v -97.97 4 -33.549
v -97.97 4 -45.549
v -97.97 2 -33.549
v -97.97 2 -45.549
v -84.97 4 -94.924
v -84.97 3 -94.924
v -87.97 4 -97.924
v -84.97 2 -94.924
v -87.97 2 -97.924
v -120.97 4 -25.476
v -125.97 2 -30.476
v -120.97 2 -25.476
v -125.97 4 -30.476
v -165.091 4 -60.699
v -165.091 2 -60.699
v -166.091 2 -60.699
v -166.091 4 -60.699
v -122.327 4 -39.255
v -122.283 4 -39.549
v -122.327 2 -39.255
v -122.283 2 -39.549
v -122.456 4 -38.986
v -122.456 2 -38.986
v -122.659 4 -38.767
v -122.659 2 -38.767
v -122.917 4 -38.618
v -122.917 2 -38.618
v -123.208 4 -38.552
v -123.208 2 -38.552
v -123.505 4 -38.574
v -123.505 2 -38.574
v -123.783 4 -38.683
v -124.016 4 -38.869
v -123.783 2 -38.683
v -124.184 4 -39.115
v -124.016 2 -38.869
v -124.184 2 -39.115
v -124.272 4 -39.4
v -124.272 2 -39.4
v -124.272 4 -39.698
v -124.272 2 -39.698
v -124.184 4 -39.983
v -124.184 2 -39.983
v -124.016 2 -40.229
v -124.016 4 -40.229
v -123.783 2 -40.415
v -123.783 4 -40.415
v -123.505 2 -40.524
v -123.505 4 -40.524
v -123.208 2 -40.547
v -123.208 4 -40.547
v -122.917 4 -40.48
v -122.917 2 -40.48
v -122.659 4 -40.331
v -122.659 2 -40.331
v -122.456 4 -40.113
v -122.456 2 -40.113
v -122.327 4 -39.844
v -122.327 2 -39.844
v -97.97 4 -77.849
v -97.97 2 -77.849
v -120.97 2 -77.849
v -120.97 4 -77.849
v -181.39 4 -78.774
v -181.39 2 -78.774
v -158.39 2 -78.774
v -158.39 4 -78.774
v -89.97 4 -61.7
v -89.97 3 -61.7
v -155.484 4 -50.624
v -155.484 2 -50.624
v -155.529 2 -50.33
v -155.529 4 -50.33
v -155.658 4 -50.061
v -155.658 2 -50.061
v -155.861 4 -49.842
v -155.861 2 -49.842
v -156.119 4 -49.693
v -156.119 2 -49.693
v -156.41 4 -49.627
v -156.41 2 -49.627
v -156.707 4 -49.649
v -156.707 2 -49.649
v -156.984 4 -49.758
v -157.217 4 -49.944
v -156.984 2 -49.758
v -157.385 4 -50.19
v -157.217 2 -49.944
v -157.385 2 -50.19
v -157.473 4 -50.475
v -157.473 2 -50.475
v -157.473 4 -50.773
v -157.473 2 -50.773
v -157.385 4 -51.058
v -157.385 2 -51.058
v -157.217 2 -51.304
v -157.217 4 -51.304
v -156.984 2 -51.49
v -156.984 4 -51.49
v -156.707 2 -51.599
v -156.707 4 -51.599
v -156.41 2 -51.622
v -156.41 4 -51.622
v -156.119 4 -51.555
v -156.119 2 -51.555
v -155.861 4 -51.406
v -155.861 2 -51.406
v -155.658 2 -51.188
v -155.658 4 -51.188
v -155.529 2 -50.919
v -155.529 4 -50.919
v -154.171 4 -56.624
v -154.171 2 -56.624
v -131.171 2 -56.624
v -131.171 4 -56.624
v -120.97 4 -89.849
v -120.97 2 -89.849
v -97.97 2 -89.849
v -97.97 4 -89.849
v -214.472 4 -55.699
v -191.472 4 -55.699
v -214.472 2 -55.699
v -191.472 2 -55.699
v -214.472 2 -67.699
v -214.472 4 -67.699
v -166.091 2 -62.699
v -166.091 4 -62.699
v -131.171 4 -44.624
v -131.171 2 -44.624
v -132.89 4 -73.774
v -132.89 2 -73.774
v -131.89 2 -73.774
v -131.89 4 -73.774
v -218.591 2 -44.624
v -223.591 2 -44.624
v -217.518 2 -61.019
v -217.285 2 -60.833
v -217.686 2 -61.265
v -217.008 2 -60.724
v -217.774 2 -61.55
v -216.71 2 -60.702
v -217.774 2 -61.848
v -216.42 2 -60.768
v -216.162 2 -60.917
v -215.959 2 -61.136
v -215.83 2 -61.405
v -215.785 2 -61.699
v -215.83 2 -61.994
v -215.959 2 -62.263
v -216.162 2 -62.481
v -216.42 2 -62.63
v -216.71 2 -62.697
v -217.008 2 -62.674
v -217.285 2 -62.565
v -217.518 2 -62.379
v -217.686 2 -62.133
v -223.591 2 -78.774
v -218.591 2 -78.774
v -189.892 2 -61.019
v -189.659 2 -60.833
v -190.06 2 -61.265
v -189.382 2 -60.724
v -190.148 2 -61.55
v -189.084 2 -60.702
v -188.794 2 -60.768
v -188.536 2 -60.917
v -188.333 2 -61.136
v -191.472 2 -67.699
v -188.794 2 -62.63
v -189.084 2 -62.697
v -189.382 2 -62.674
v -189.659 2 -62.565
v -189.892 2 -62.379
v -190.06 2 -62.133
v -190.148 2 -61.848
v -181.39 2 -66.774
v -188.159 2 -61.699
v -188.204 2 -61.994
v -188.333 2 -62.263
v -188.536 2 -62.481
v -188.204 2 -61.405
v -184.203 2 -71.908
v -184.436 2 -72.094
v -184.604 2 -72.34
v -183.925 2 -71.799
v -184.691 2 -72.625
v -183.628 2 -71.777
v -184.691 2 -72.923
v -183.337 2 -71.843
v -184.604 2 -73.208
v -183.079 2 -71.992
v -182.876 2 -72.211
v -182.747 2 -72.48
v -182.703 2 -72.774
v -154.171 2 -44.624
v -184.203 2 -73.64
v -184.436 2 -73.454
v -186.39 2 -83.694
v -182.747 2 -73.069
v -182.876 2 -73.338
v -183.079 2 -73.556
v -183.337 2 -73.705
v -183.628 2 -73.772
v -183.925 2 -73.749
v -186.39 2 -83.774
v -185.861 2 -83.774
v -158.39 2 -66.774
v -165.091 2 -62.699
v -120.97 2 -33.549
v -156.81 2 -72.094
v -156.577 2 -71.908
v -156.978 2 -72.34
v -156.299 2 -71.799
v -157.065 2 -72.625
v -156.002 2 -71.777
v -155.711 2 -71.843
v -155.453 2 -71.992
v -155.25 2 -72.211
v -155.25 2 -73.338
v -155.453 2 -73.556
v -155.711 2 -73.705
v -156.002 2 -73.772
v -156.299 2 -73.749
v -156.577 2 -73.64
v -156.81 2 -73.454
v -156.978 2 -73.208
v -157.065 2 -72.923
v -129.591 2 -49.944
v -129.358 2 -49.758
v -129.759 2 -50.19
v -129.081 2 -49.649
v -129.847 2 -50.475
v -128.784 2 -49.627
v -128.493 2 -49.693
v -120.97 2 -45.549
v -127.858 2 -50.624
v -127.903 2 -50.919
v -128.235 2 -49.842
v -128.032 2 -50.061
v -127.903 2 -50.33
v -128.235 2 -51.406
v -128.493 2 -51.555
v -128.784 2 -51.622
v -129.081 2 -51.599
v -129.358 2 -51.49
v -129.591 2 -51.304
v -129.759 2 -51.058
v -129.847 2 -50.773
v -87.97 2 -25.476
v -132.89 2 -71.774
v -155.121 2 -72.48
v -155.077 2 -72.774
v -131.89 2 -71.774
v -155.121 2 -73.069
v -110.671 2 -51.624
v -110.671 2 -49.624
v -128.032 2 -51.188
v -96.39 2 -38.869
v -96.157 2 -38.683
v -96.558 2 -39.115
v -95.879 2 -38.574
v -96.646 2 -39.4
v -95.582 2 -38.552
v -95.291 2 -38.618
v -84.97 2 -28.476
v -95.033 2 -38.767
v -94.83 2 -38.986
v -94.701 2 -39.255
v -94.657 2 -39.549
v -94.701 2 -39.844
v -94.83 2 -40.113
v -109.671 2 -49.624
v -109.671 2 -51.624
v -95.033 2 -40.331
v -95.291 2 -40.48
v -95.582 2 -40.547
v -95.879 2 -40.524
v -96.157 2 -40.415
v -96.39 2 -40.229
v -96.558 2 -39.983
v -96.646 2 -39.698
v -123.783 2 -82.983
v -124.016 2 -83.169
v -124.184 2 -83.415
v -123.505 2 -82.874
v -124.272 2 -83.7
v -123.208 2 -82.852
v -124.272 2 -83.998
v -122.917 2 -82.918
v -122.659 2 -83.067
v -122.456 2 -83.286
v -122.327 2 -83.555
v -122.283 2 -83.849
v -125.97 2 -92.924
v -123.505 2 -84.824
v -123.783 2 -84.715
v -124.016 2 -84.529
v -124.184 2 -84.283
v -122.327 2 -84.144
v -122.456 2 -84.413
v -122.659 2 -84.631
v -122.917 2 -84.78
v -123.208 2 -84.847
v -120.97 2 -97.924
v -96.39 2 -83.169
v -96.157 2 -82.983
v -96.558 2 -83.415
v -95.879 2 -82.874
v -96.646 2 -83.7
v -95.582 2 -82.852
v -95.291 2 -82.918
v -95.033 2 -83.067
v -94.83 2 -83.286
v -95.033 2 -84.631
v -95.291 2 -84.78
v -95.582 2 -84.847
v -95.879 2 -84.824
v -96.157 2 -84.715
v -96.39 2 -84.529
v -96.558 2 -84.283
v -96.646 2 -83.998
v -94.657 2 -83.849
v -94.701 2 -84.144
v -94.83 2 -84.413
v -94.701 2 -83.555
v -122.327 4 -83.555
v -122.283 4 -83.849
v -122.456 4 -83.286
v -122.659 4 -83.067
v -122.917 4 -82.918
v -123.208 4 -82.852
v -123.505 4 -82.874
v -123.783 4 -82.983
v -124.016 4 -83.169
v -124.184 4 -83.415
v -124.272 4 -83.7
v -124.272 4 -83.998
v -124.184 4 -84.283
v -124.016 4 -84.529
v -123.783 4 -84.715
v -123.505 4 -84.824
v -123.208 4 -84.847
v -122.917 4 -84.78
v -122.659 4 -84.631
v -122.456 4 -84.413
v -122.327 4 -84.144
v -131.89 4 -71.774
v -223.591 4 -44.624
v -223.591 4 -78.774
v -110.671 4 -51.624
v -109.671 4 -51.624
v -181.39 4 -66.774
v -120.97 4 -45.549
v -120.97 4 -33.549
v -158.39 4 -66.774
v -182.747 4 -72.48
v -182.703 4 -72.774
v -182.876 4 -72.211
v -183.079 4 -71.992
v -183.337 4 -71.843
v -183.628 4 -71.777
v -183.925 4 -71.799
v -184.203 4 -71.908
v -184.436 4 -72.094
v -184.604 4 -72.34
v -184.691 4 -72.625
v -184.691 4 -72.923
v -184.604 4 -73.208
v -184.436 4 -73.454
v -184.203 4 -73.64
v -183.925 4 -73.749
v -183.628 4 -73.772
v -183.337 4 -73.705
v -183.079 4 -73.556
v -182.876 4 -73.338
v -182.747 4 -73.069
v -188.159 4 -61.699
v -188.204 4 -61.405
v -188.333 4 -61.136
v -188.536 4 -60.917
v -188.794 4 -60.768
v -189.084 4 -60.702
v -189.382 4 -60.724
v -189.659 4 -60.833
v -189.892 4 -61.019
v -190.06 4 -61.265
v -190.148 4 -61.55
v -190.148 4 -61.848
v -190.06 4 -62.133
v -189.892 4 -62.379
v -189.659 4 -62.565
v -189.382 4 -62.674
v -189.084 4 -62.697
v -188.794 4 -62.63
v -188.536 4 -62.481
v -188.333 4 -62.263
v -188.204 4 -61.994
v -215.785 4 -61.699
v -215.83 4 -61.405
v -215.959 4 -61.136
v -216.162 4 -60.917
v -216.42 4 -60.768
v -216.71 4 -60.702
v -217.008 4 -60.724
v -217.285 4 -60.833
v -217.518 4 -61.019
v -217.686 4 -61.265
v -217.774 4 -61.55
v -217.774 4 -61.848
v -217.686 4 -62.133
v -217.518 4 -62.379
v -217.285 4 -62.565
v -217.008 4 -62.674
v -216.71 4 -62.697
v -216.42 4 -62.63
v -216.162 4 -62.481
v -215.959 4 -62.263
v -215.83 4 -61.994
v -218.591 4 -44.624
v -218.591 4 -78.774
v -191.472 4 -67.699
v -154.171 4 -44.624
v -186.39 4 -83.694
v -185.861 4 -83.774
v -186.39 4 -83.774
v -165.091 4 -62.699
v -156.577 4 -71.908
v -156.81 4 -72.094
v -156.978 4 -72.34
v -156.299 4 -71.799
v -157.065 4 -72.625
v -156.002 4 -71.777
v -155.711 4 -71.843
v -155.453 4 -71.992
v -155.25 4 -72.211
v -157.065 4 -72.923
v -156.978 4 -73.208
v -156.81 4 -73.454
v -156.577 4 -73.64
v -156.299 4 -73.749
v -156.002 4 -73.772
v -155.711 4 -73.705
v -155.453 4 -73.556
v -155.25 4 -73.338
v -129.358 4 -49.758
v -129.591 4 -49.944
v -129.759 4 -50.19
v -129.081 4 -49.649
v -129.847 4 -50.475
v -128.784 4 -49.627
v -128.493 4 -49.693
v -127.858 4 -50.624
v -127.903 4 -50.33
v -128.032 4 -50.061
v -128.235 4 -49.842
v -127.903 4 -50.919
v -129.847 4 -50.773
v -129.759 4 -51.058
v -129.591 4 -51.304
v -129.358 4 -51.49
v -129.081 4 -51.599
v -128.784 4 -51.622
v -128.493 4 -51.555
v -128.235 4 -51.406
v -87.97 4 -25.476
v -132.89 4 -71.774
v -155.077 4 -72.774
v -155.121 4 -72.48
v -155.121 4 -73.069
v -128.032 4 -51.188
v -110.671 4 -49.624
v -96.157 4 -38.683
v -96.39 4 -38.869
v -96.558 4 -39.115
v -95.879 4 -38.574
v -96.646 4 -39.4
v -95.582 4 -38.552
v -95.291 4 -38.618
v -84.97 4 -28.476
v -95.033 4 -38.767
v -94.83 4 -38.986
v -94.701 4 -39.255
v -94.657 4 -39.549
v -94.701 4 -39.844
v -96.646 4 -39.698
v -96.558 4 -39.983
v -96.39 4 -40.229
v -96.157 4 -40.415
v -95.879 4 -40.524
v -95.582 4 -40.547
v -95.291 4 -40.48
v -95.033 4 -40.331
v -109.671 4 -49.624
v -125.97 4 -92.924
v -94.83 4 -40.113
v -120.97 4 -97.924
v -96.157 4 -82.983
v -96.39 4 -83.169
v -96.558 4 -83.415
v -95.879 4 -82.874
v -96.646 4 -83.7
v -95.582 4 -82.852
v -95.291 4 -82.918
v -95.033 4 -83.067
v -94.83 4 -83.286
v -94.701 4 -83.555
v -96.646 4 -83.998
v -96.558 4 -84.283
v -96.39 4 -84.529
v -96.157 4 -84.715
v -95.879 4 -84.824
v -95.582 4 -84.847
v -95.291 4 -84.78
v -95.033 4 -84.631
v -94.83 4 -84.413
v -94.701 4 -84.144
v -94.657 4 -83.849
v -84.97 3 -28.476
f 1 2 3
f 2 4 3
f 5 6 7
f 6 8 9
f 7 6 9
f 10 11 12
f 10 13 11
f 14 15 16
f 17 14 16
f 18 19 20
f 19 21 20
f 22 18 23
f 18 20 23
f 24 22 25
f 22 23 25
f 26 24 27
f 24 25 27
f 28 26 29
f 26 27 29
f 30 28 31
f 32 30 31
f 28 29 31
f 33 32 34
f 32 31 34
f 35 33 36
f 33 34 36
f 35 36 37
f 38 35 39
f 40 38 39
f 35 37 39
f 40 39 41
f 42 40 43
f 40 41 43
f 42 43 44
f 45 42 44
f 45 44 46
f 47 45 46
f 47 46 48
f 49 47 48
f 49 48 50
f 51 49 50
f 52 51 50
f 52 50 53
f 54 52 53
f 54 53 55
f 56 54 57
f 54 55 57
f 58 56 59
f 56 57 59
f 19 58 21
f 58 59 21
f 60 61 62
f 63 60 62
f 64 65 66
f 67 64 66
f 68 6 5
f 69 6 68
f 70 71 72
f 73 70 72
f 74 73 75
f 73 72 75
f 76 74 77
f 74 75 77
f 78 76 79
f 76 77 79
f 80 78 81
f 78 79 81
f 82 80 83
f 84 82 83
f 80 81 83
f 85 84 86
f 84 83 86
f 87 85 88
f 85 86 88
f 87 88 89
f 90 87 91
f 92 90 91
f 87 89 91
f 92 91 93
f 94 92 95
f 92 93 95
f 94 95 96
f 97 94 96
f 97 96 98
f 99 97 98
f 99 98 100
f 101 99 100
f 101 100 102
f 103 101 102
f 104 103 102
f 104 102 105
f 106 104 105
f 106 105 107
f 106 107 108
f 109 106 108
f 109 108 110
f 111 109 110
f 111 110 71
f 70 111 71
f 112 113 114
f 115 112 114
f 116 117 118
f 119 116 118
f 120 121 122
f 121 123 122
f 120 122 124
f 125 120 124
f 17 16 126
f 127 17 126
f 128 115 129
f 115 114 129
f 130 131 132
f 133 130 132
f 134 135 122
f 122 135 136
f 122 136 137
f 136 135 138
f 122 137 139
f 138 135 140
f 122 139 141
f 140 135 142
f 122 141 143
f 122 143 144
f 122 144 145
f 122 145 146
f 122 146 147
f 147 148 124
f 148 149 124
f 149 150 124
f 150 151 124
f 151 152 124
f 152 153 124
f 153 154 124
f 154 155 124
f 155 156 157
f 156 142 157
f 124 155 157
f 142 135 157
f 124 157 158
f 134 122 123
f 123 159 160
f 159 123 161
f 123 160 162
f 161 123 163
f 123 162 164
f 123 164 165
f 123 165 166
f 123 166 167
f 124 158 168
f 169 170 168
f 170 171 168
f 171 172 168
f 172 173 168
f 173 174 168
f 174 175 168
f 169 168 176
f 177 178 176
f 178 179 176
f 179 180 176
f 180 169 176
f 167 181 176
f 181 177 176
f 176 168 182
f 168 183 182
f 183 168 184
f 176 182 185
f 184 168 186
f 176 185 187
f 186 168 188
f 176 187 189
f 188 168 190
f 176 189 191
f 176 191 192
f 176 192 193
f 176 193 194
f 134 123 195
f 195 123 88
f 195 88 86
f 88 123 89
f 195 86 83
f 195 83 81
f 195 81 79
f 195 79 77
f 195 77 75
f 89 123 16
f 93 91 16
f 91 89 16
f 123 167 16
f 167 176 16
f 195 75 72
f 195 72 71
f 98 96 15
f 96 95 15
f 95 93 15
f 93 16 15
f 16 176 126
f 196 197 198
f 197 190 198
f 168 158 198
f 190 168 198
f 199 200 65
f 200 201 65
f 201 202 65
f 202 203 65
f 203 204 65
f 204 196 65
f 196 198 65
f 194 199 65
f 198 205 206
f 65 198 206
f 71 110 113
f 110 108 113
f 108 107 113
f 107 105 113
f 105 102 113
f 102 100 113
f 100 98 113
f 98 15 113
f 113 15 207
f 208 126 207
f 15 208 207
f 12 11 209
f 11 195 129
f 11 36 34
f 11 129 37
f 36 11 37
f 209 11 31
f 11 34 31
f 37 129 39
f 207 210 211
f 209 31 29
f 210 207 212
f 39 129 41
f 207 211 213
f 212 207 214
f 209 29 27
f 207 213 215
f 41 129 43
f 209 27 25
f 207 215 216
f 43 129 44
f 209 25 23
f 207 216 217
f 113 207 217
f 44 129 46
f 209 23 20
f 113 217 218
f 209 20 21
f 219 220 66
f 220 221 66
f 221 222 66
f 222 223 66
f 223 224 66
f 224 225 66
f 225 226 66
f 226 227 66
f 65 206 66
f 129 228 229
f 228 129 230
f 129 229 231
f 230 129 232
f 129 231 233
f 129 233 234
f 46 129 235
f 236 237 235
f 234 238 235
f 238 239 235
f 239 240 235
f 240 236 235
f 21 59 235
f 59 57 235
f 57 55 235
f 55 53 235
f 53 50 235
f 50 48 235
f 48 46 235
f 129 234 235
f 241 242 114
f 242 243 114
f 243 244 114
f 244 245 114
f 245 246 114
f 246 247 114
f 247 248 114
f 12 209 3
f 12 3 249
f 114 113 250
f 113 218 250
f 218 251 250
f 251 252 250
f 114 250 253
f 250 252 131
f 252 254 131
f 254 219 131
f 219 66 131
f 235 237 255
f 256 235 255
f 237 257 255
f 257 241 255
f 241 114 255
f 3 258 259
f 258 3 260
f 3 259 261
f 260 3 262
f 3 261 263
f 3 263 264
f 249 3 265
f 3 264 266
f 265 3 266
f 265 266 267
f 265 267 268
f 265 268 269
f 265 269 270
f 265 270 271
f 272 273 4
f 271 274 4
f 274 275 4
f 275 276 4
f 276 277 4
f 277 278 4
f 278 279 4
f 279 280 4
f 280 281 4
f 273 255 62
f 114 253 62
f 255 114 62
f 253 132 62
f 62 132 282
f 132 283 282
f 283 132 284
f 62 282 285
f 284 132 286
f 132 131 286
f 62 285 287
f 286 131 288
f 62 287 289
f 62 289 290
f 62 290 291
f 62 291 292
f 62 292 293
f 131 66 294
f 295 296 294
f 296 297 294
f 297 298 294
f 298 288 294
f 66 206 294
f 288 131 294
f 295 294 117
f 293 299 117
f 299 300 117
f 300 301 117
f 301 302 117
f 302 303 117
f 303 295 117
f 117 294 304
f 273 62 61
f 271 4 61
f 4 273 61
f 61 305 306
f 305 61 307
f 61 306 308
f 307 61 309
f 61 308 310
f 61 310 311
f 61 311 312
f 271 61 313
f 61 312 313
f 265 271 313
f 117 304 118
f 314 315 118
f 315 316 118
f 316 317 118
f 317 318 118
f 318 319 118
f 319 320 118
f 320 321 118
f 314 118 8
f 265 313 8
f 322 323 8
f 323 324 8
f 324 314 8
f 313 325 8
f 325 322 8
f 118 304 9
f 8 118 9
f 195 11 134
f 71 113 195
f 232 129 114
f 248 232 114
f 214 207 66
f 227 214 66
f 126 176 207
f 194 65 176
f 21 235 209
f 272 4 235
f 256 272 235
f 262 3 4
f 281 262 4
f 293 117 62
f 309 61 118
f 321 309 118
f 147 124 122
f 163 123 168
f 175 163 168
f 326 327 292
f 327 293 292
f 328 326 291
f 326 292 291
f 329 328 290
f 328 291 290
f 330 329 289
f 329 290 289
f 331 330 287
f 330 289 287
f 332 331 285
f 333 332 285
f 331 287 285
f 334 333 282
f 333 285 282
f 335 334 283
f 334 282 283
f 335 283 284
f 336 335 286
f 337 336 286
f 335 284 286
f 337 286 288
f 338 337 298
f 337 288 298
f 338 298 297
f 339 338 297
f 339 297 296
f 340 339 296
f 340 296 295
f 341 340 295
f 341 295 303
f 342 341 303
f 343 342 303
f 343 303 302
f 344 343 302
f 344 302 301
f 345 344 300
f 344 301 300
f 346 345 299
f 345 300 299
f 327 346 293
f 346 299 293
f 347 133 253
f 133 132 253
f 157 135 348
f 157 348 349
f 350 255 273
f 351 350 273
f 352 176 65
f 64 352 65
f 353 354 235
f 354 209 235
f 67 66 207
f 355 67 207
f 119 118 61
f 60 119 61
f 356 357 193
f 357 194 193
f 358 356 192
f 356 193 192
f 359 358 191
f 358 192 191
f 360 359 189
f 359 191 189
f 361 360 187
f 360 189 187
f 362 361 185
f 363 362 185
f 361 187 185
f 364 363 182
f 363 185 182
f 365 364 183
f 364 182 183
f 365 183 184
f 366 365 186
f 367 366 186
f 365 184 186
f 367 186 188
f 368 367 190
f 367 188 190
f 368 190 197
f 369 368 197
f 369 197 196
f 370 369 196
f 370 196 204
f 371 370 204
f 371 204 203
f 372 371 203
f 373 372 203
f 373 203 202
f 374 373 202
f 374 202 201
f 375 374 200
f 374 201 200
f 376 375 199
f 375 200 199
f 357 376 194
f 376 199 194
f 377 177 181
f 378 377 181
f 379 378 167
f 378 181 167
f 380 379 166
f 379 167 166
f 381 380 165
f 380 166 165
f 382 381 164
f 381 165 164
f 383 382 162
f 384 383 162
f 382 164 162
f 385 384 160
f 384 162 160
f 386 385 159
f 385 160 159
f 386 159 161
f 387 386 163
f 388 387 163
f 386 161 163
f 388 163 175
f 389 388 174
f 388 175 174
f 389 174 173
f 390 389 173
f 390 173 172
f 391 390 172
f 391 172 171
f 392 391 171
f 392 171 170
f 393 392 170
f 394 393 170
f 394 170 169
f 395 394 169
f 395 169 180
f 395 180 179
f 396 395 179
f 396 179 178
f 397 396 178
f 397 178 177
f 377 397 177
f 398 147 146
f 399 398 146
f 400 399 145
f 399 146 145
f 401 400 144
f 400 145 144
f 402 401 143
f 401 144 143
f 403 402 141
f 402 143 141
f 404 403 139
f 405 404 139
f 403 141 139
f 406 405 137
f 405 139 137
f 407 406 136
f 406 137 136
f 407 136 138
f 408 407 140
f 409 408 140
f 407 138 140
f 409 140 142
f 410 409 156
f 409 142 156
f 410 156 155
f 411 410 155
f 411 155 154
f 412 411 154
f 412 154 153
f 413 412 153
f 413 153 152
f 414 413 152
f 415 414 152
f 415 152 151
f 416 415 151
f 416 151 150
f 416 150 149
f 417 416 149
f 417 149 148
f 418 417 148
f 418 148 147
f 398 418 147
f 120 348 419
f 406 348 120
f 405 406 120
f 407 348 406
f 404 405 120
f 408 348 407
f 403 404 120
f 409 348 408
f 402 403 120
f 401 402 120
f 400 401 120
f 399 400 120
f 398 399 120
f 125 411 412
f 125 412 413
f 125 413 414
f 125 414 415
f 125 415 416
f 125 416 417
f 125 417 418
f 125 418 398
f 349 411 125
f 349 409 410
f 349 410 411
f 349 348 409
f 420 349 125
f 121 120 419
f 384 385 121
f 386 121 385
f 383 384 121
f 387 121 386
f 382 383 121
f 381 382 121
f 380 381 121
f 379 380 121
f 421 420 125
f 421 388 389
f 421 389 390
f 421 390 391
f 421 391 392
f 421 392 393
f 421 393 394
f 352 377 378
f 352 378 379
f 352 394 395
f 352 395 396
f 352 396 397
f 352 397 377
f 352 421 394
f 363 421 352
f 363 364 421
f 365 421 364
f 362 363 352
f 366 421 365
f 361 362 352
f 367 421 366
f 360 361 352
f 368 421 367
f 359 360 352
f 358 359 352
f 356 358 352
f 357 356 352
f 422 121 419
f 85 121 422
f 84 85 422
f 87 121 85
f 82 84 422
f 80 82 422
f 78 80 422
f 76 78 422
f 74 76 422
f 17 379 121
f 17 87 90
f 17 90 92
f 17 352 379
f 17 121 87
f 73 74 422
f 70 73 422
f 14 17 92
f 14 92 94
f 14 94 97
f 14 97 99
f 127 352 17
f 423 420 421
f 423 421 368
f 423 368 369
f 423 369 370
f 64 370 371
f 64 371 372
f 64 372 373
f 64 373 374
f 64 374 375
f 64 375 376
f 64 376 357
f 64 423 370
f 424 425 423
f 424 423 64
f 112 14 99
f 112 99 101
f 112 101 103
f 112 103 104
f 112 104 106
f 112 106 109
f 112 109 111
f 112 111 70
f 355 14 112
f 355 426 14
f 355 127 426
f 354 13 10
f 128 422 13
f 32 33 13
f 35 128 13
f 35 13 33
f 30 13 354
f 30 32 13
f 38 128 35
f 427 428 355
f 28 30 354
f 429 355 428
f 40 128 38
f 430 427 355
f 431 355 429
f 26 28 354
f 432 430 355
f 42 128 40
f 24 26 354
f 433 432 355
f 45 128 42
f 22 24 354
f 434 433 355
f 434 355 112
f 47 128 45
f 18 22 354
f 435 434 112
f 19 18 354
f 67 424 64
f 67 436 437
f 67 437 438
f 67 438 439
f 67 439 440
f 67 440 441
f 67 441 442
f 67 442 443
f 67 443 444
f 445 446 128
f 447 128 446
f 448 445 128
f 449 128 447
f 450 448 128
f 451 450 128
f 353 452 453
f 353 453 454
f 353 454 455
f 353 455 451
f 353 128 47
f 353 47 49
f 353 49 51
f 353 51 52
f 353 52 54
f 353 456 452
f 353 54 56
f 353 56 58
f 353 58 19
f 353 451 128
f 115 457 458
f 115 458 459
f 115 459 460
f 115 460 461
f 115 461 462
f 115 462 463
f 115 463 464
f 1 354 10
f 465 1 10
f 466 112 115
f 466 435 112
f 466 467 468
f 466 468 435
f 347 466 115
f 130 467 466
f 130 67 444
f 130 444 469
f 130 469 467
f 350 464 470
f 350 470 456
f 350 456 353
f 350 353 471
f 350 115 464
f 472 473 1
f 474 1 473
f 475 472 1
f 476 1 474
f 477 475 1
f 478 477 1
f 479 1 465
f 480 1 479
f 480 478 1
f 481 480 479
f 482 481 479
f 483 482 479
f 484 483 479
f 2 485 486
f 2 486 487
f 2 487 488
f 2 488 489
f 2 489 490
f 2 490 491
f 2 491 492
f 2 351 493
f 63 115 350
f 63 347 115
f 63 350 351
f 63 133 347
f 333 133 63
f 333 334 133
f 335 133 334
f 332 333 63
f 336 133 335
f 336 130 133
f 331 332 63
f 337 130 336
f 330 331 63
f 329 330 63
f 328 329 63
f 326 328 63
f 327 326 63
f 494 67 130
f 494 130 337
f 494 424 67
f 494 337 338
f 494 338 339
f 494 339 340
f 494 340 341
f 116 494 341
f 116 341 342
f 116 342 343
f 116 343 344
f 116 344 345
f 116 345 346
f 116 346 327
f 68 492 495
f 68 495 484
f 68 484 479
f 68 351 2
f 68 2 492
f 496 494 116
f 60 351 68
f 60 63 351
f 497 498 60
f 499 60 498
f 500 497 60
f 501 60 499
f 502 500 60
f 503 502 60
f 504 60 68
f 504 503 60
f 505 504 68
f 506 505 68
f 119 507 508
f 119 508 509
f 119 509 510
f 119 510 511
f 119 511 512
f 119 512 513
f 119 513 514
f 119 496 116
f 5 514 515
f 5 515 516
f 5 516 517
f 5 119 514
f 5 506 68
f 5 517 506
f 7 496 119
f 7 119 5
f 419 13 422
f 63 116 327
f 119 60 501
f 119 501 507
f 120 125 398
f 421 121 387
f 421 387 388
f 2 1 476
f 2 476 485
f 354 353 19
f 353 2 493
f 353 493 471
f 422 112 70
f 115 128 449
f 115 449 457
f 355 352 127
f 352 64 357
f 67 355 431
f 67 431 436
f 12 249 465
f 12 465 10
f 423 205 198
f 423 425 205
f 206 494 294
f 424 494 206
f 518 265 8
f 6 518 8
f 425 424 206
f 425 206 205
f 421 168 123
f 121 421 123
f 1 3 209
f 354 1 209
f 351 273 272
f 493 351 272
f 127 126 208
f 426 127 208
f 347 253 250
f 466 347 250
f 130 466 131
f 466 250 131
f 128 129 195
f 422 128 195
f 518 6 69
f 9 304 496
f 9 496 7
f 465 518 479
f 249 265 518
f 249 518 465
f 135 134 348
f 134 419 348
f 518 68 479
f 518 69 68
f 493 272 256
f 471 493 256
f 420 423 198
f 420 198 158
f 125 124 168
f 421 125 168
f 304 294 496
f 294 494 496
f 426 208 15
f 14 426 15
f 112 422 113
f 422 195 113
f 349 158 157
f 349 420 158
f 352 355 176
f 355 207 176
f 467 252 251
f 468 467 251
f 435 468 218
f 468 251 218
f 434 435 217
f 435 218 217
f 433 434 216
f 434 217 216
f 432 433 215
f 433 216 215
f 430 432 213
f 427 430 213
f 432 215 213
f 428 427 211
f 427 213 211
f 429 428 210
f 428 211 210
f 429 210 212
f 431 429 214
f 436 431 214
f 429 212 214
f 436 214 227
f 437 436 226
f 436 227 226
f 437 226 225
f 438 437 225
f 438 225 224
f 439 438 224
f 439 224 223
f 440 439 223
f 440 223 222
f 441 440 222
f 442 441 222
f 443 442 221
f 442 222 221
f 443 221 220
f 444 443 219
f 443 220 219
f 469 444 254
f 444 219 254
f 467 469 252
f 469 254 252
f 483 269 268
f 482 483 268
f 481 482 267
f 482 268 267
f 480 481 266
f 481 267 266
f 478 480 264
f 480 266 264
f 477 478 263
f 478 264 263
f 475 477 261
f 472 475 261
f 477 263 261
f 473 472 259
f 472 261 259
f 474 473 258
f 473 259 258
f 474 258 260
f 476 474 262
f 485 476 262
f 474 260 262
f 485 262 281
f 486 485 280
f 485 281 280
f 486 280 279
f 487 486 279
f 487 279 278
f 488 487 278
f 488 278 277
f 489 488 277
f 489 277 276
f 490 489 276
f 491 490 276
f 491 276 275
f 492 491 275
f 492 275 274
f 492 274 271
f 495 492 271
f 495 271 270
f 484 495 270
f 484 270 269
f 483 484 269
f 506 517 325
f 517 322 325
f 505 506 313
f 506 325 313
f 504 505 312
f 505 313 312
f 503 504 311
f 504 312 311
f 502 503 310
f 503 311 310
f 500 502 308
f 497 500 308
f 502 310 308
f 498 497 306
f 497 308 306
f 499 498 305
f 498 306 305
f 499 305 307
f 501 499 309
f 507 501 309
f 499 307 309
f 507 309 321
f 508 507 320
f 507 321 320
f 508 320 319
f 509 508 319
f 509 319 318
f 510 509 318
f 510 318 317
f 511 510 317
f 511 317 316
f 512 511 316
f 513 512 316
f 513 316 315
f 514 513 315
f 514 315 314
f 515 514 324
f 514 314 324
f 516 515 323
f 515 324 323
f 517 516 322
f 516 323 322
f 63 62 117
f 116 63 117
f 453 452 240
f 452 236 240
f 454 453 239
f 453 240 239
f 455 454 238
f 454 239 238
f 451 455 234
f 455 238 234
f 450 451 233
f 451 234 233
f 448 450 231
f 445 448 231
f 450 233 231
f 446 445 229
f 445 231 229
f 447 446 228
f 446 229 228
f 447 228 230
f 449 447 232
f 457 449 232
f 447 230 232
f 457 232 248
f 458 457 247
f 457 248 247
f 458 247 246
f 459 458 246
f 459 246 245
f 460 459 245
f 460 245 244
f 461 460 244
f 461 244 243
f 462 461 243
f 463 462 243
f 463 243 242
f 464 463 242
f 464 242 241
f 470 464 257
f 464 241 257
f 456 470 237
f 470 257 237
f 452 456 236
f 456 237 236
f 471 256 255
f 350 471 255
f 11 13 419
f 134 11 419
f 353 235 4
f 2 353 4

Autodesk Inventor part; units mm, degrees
ref_plane "YZ Plane" through (0, 0, 0) normal (1, 0, 0) x (0, 1, 0)
ref_plane "XZ Plane" through (0, 0, 0) normal (0, 1, 0) x (-1, 0, 0)
ref_plane "Work Plane1" through (0, 2, 0) normal (0, 1, 0) x (1, 0, 0)
sketch "Sketch4" plane through (0, 2, 0) normal (0, 1, 0) x (1, 0, 0)
  line L0 (-81.9697, 60.7) -> (-81.9697, 62.7) projected
  line L1 (-81.9697, 62.7) -> (-80.9697, 62.7) projected
  line L2 (-80.9697, 62.7) -> (-80.9697, 60.7) projected
  line L3 (-80.9697, 60.7) -> (-81.9697, 60.7) projected
  line L4 (-81.9697, 49.6253) -> (-81.9697, 51.6253) projected
  line L5 (-81.9697, 51.6253) -> (-80.9697, 51.6253) projected
  line L6 (-80.9697, 51.6253) -> (-80.9697, 49.6253) projected
  line L7 (-80.9697, 49.6253) -> (-81.9697, 49.6253) projected
  line L8 (-81.9697, 71.7747) -> (-81.9697, 73.7747) projected
  line L9 (-81.9697, 73.7747) -> (-80.9697, 73.7747) projected
  line L10 (-80.9697, 73.7747) -> (-80.9697, 71.7747) projected
  line L11 (-80.9697, 71.7747) -> (-81.9697, 71.7747) projected
  line L12 (-81.9697, 38.5507) -> (-81.9697, 40.5507) projected
  line L13 (-81.9697, 40.5507) -> (-80.9697, 40.5507) projected
  line L14 (-80.9697, 40.5507) -> (-80.9697, 38.5507) projected
  line L15 (-80.9697, 38.5507) -> (-81.9697, 38.5507) projected
  line L16 (-81.9697, 82.8493) -> (-81.9697, 84.8493) projected
  line L17 (-81.9697, 84.8493) -> (-80.9697, 84.8493) projected
  line L18 (-80.9697, 84.8493) -> (-80.9697, 82.8493) projected
  line L19 (-80.9697, 82.8493) -> (-81.9697, 82.8493) projected
  line L20 (-61.9934, 117.9) -> (-84.9697, 94.9237) projected
  line L21 (-84.9697, 94.9237) -> (-89.9697, 61.7) projected
  line L22 (-89.9697, 61.7) -> (-84.9697, 28.4763) projected
  line L23 (-84.9697, 28.4763) -> (-61.9934, 5.5) projected
  line L24 (-61.9934, 5.5) -> (0, 5.5) projected
  line L25 (0, 5.5) -> (0, 117.9) projected
  line L26 (0, 117.9) -> (-61.9934, 117.9) projected
  line L27 (-89.9697, 61.7) -> (-84.9697, 94.9237) projected
  line L28 (-84.9697, 94.9237) -> (-220.5912, 94.9237)
  line L29 (-220.5912, 94.9237) -> (-220.5912, 28.4763)
  line L30 (-220.5912, 28.4763) -> (-84.9697, 28.4763)
  line L31 (-84.9697, 28.4763) -> (-84.9697, 94.9237)
  line L32 (-91.9697, 94.9237) -> (-91.9697, 28.4763)
  line L33 (-81.9697, 25.4763) -> (-223.5912, 25.4763)
  line L34 (-223.5912, 25.4763) -> (-223.5912, 97.9237)
  line L35 (-223.5912, 97.9237) -> (-81.9697, 97.9237)
  line L36 (-81.9697, 97.9237) -> (-81.9697, 25.4763)
  line L37 (-84.9697, 94.9237) -> (-84.9697, 28.4763) projected
  line L38 (-84.9697, 28.4763) -> (-87.9697, 25.4763)
  line L39 (-84.9697, 28.4763) -> (-80.7271, 28.4763) construction
  line L40 (-84.9697, 94.9237) -> (-87.9697, 97.9237)
  line L41 (-84.9697, 94.9237) -> (-80.7271, 94.9237) construction
  line L42 (-81.9697, 83.8493) -> (-220.5912, 83.8493)
  line L43 (-81.9697, 83.8493) -> (56.6518, 83.8493) construction
  line L44 (-81.9697, 72.7743) -> (-220.5912, 72.7743)
  line L45 (-81.9697, 61.6993) -> (-220.5912, 61.6993)
  line L46 (-81.9697, 50.6243) -> (-220.5912, 50.6243)
  line L47 (-81.9697, 39.5493) -> (-220.5912, 39.5493)
  circle A0 centre (-109.4697, 83.8493) radius 17.5
  circle A1 centre (-109.4697, 39.5493) radius 17.5
  circle A2 centre (-203.0912, 61.6993) radius 17.5
  line L48 (-182.3896, 71.2657) -> (-182.3896, 65.7743)
  line L49 (-182.3896, 65.7743) -> (-157.3896, 65.7743)
  line L50 (-157.3896, 65.7743) -> (-157.3896, 71.2657)
  arc A3 (-157.3896, 71.2657) -> (-157.3896, 74.283) centre (-156.0766, 72.7743) ccw
  line L51 (-157.3896, 74.283) -> (-157.3896, 79.7743)
  line L52 (-157.3896, 79.7743) -> (-182.3896, 79.7743)
  line L53 (-182.3896, 79.7743) -> (-182.3896, 74.283)
  arc A4 (-182.3896, 74.283) -> (-182.3896, 71.2657) centre (-183.7026, 72.7743) ccw
  line L54 (-181.3896, 66.7743) -> (-181.3896, 78.7743)
  line L55 (-181.3896, 78.7743) -> (-158.3896, 78.7743)
  line L56 (-158.3896, 78.7743) -> (-158.3896, 66.7743)
  line L57 (-158.3896, 66.7743) -> (-181.3896, 66.7743)
  circle A5 centre (-156.0766, 72.7743) radius 1
  circle A6 centre (-183.7026, 72.7743) radius 1
  line L58 (-169.8896, 78.7743) -> (-169.8896, 66.7743)
  line L59 (-158.3896, 72.7743) -> (-181.3896, 72.7743)
  circle A7 centre (-169.8896, 72.7743) radius 0.5
  line L60 (-121.9697, 82.3407) -> (-121.9697, 76.8493)
  line L61 (-121.9697, 76.8493) -> (-96.9697, 76.8493)
  line L62 (-96.9697, 76.8493) -> (-96.9697, 82.3407)
  arc A8 (-96.9697, 82.3407) -> (-96.9697, 85.358) centre (-95.6567, 83.8493) ccw
  line L63 (-96.9697, 85.358) -> (-96.9697, 90.8493)
  line L64 (-96.9697, 90.8493) -> (-121.9697, 90.8493)
  line L65 (-121.9697, 90.8493) -> (-121.9697, 85.358)
  arc A9 (-121.9697, 85.358) -> (-121.9697, 82.3407) centre (-123.2827, 83.8493) ccw
  line L66 (-120.9697, 77.8493) -> (-120.9697, 89.8493)
  line L67 (-120.9697, 89.8493) -> (-97.9697, 89.8493)
  line L68 (-97.9697, 89.8493) -> (-97.9697, 77.8493)
  line L69 (-97.9697, 77.8493) -> (-120.9697, 77.8493)
  circle A10 centre (-95.6567, 83.8493) radius 1
  circle A11 centre (-123.2827, 83.8493) radius 1
  line L70 (-109.4697, 89.8493) -> (-109.4697, 77.8493)
  line L71 (-97.9697, 83.8493) -> (-120.9697, 83.8493)
  circle A12 centre (-109.4697, 83.8493) radius 0.5
  line L72 (-155.1713, 49.1157) -> (-155.1713, 43.6243)
  line L73 (-155.1713, 43.6243) -> (-130.1713, 43.6243)
  line L74 (-130.1713, 43.6243) -> (-130.1713, 49.1157)
  arc A13 (-130.1713, 49.1157) -> (-130.1713, 52.133) centre (-128.8583, 50.6243) ccw
  line L75 (-130.1713, 52.133) -> (-130.1713, 57.6243)
  line L76 (-130.1713, 57.6243) -> (-155.1713, 57.6243)
  line L77 (-155.1713, 57.6243) -> (-155.1713, 52.133)
  arc A14 (-155.1713, 52.133) -> (-155.1713, 49.1157) centre (-156.4843, 50.6243) ccw
  line L78 (-154.1713, 44.6243) -> (-154.1713, 56.6243)
  line L79 (-154.1713, 56.6243) -> (-131.1713, 56.6243)
  line L80 (-131.1713, 56.6243) -> (-131.1713, 44.6243)
  line L81 (-131.1713, 44.6243) -> (-154.1713, 44.6243)
  circle A15 centre (-128.8583, 50.6243) radius 1
  circle A16 centre (-156.4843, 50.6243) radius 1
  line L82 (-142.6713, 56.6243) -> (-142.6713, 44.6243)
  line L83 (-131.1713, 50.6243) -> (-154.1713, 50.6243)
  circle A17 centre (-142.6713, 50.6243) radius 0.5
  circle A18 centre (-216.7852, 61.6993) radius 1
  arc A19 (-215.4722, 63.208) -> (-215.4722, 60.1907) centre (-216.7852, 61.6993) ccw
  circle A20 centre (-189.1592, 61.6993) radius 1
  arc A21 (-190.4722, 60.1907) -> (-190.4722, 63.208) centre (-189.1592, 61.6993) ccw
  line L84 (-215.4722, 54.6993) -> (-190.4722, 54.6993)
  line L85 (-191.4722, 55.6993) -> (-214.4722, 55.6993)
  circle A22 centre (-202.9722, 61.6993) radius 0.5
  line L86 (-191.4722, 67.6993) -> (-191.4722, 55.6993)
  line L87 (-190.4722, 63.208) -> (-190.4722, 68.6993)
  line L88 (-215.4722, 60.1907) -> (-215.4722, 54.6993)
  line L89 (-191.4722, 61.6993) -> (-214.4722, 61.6993)
  line L90 (-202.9722, 67.6993) -> (-202.9722, 55.6993)
  line L91 (-214.4722, 55.6993) -> (-214.4722, 67.6993)
  line L92 (-214.4722, 67.6993) -> (-191.4722, 67.6993)
  line L93 (-215.4722, 68.6993) -> (-215.4722, 63.208)
  line L94 (-190.4722, 68.6993) -> (-215.4722, 68.6993)
  line L95 (-190.4722, 54.6993) -> (-190.4722, 60.1907)
  line L96 (-96.9697, 32.5493) -> (-96.9697, 38.0407)
  circle A23 centre (-95.6567, 39.5493) radius 1
  line L97 (-97.9697, 45.5493) -> (-97.9697, 33.5493)
  line L98 (-96.9697, 41.058) -> (-96.9697, 46.5493)
  arc A24 (-96.9697, 38.0407) -> (-96.9697, 41.058) centre (-95.6567, 39.5493) ccw
  circle A25 centre (-123.2827, 39.5493) radius 1
  line L99 (-109.4697, 45.5493) -> (-109.4697, 33.5493)
  circle A26 centre (-109.4697, 39.5493) radius 0.5
  line L100 (-97.9697, 39.5493) -> (-120.9697, 39.5493)
  line L101 (-97.9697, 33.5493) -> (-120.9697, 33.5493)
  line L102 (-120.9697, 45.5493) -> (-97.9697, 45.5493)
  line L103 (-121.9697, 32.5493) -> (-96.9697, 32.5493)
  line L104 (-96.9697, 46.5493) -> (-121.9697, 46.5493)
  line L105 (-121.9697, 38.0407) -> (-121.9697, 32.5493)
  line L106 (-120.9697, 33.5493) -> (-120.9697, 45.5493)
  arc A27 (-121.9697, 41.058) -> (-121.9697, 38.0407) centre (-123.2827, 39.5493) ccw
  line L107 (-121.9697, 46.5493) -> (-121.9697, 41.058)
  circle A28 centre (-142.6713, 50.6243) radius 17.5
  circle A29 centre (-169.8896, 72.7743) radius 17.5
  point P0 (0, 0)
  point P1 (-154.188, 74.9293)
  dimension "d22" = 7
  dimension "d23" = 3
  dimension "d24" = 135
  dimension "d25" = 135
  dimension "d26" = 180
  dimension "d29" = 11.075
  dimension "d34" = 35
  dimension "d35" = 17.5
  dimension "d36" = 0
  dimension "d37" = 35
  dimension "d38" = 0
  dimension "d39" = 17.5
  dimension "d44" = 35
  dimension "d45" = 0
  dimension "d46" = 17.5
  dimension "d47" = 1
  dimension "d48" = 1
  dimension "d49" = 1
  dimension "d50" = 1
  dimension "d51" = 1
  dimension "d56" = 35
  dimension "d57" = 35
extrude "Extrusion4" add sketch "Sketch4" along normal blind 2 contours L45 L32 L44 L21 | L22 L46 L32 L45 | L22 L47 L32 L46 | L44 L32 L42 L21 | L45 A28 A29 L44 A0 L32 | L32 L46 A1 A28 L45 | L30 L32 L47 L22 | L38 L33 A1 L30 | L32 A1 L46 | L21 L42 L32 L28 | L28 A0 L35 L40 | L44 A0 L32 | A28 L46 A13 L75 L76 L77 A14 L45 | L45 A28 | L30 A1 L32 | A1 L30 L47 A27 L105 L103 L96 A24 | L47 A24 L98 L104 L107 A27 A1 L46 | L46 A1 | L32 A0 L28 | A0 L44 L42 A9 L60 L61 L62 A8 | L42 A8 L63 L64 L65 A9 A0 L28 | A0 L44 | A28 L46 A2 L45 A29 | A28 L47 L46 A14 L72 L73 L74 A13 | L46 A1 A28 | A1 L33 L30 | A24 L96 L103 L105 A27 L47 A25 L106 L101 L97 A23 | L47 A23 L97 L102 L106 A25 A27 L107 L104 L98 A24 | L28 A0 L35 | A8 L62 L61 L60 A9 L42 A11 L66 L69 L68 A10 | L42 A10 L68 L67 L66 A11 A9 L65 L64 L63 A8 | L44 A29 L42 A0 | A29 L45 | L45 A29 L44 A4 L48 L49 L50 A3 | A28 L47 L29 L46 A2 | A13 L74 L73 L72 A14 L46 A16 L78 L81 L80 A15 | L46 A15 L80 L79 L78 A16 A14 L77 L76 L75 A13 | A1 L47 A28 | A1 L33 L34 L35 A0 L28 L29 L30 | L30 L29 L47 A28 A1 | A0 L42 A29 L29 L28 | L44 A3 L51 L52 L53 A4 A29 L42 | L45 A2 A29 | A2 L46 | L46 A2 L45 A19 L88 L84 L95 A21 | L47 A28 | A3 L50 L49 L48 A4 L44 A6 L54 L57 L56 A5 | L44 A5 L56 L55 L54 A6 A4 L53 L52 L51 A3 | L42 A29 | L45 A21 L87 L94 L93 A19 A2 L44 | A2 L44 A29 | L46 L29 A2 | L42 A29 L44 A2 L29 | A21 L95 L84 L88 A19 L45 A18 L91 L85 L86 A20 | L45 A20 L86 L92 L91 A18 A19 L93 L94 L87 A21 | L44 A2 | L29 L44 A2
extrude "Extrusion5" add sketch "Sketch4" along normal blind 1 contours L45 L21 L44 L31 | L31 L46 L22 L45 | L31 L47 L22 L46 | L44 L21 L42 L31 | L31 L22 L47 | L42 L21 L31
sketch "Sketch5" plane through (0, 2, 0) normal (0, -1, 0) x (1, 0, 0)
  line L0 (-131.8896, -71.7743) -> (-132.8896, -71.7743)
  line L1 (-132.8896, -71.7743) -> (-132.8896, -73.7743)
  line L2 (-132.8896, -73.7743) -> (-131.8896, -73.7743)
  line L3 (-131.8896, -73.7743) -> (-131.8896, -71.7743)
  line L4 (-81.9697, -50.6243) -> (-220.5912, -50.6243) projected
  line L5 (-81.9697, -61.6993) -> (-220.5912, -61.6993) projected
  line L6 (-81.9697, -72.7743) -> (-220.5912, -72.7743) projected
  circle A0 centre (-169.8896, -72.7743) radius 17.5 projected
  circle A1 centre (-203.0912, -61.6993) radius 17.5 projected
  circle A2 centre (-142.6713, -50.6243) radius 17.5 projected
  line L7 (-109.6713, -49.6243) -> (-110.6713, -49.6243)
  line L8 (-110.6713, -49.6243) -> (-110.6713, -51.6243)
  line L9 (-110.6713, -51.6243) -> (-109.6713, -51.6243)
  line L10 (-109.6713, -51.6243) -> (-109.6713, -49.6243)
  line L11 (-165.0912, -60.6993) -> (-166.0912, -60.6993)
  line L12 (-166.0912, -60.6993) -> (-166.0912, -62.6993)
  line L13 (-166.0912, -62.6993) -> (-165.0912, -62.6993)
  line L14 (-165.0912, -62.6993) -> (-165.0912, -60.6993)
  point P0 (0, 0)
  point P1 (-132.8896, -72.7743)
  point P2 (-132.3896, -73.7743)
  point P3 (-110.6713, -50.6243)
  point P4 (-110.1713, -51.6243)
  point P5 (-166.0912, -61.6993)
  point P6 (-165.5912, -60.6993)
  dimension "d58" = 1
  dimension "d59" = 2
  dimension "d60" = 0
  dimension "d61" = 37.5
  dimension "d62" = 1
  dimension "d63" = 2
  dimension "d64" = 0
  dimension "d65" = 32.5
  dimension "d66" = 1
  dimension "d67" = 2
  dimension "d68" = 0
  dimension "d69" = 37.5
extrude "Extrusion6" cut sketch "Sketch5" against normal up to surface (2 mm away) contours L3 L6 L1 L0 | L8 L7 L10 L4 | L4 L10 L9 L8 | L3 L2 L1 L6 | L14 L13 L12 L5 | L5 L12 L11 L14
sketch "Sketch6" plane through (0, 4, 0) normal (0, 1, 0) x (1, 0, 0)
  line L0 (-166.0912, 62.6993) -> (-165.0912, 62.6993) projected
  line L1 (-165.0912, 62.6993) -> (-165.0912, 60.6993) projected
  line L2 (-165.0912, 60.6993) -> (-166.0912, 60.6993) projected
  line L3 (-166.0912, 60.6993) -> (-166.0912, 62.6993) projected
  line L4 (-110.6713, 51.6243) -> (-109.6713, 51.6243) projected
  line L5 (-109.6713, 51.6243) -> (-109.6713, 49.6243) projected
  line L6 (-109.6713, 49.6243) -> (-110.6713, 49.6243) projected
  line L7 (-110.6713, 49.6243) -> (-110.6713, 51.6243) projected
  line L8 (-131.8896, 73.7743) -> (-131.8896, 71.7743) projected
  line L9 (-131.8896, 71.7743) -> (-132.8896, 71.7743) projected
  line L10 (-132.8896, 71.7743) -> (-132.8896, 73.7743) projected
  line L11 (-132.8896, 73.7743) -> (-131.8896, 73.7743) projected
  line L12 (-84.9697, 94.9237) -> (-87.9697, 97.9237) projected
  line L13 (-87.9697, 97.9237) -> (-223.5912, 97.9237) projected
  line L14 (-223.5912, 97.9237) -> (-223.5912, 25.4763) projected
  line L15 (-223.5912, 25.4763) -> (-87.9697, 25.4763) projected
  line L16 (-87.9697, 25.4763) -> (-84.9697, 28.4763) projected
  line L17 (-84.9697, 28.4763) -> (-89.9697, 61.7) projected
  line L18 (-89.9697, 61.7) -> (-84.9697, 94.9237) projected
  line L19 (-181.3896, 66.7743) -> (-181.3896, 78.7743) projected
  line L20 (-181.3896, 78.7743) -> (-158.3896, 78.7743) projected
  line L21 (-158.3896, 78.7743) -> (-158.3896, 66.7743) projected
  line L22 (-158.3896, 66.7743) -> (-181.3896, 66.7743) projected
  circle A0 centre (-156.0766, 72.7743) radius 1 projected
  line L23 (-120.9697, 77.8493) -> (-120.9697, 89.8493) projected
  line L24 (-120.9697, 89.8493) -> (-97.9697, 89.8493) projected
  line L25 (-97.9697, 89.8493) -> (-97.9697, 77.8493) projected
  line L26 (-97.9697, 77.8493) -> (-120.9697, 77.8493) projected
  circle A1 centre (-95.6567, 83.8493) radius 1 projected
  circle A2 centre (-156.4843, 50.6243) radius 1 projected
  line L27 (-154.1713, 44.6243) -> (-154.1713, 56.6243) projected
  line L28 (-154.1713, 56.6243) -> (-131.1713, 56.6243) projected
  line L29 (-131.1713, 56.6243) -> (-131.1713, 44.6243) projected
  line L30 (-131.1713, 44.6243) -> (-154.1713, 44.6243) projected
  circle A3 centre (-216.7852, 61.6993) radius 1 projected
  line L31 (-214.4722, 55.6993) -> (-214.4722, 67.6993) projected
  line L32 (-214.4722, 67.6993) -> (-191.4722, 67.6993) projected
  line L33 (-191.4722, 67.6993) -> (-191.4722, 55.6993) projected
  line L34 (-191.4722, 55.6993) -> (-214.4722, 55.6993) projected
  circle A4 centre (-123.2827, 39.5493) radius 1 projected
  line L35 (-120.9697, 33.5493) -> (-120.9697, 45.5493) projected
  line L36 (-120.9697, 45.5493) -> (-97.9697, 45.5493) projected
  line L37 (-97.9697, 45.5493) -> (-97.9697, 33.5493) projected
  line L38 (-97.9697, 33.5493) -> (-120.9697, 33.5493) projected
  circle A5 centre (-95.6567, 39.5493) radius 1 projected
  circle A6 centre (-189.1592, 61.6993) radius 1 projected
  circle A7 centre (-183.7026, 72.7743) radius 1 projected
  circle A8 centre (-123.2827, 83.8493) radius 1 projected
  circle A9 centre (-128.8583, 50.6243) radius 1 projected
  line L39 (-153.3896, 83.7743) -> (-186.3896, 83.7743)
  line L40 (-186.3896, 83.7743) -> (-186.3896, 61.7743)
  line L41 (-186.3896, 61.7743) -> (-153.3896, 61.7743)
  line L42 (-153.3896, 61.7743) -> (-153.3896, 83.7743)
  line L43 (-218.5912, 92.9237) -> (-90.327, 92.9237)
  line L44 (-90.327, 92.9237) -> (-95.026, 61.7)
  line L45 (-95.026, 61.7) -> (-90.327, 30.4763)
  line L46 (-90.327, 30.4763) -> (-218.5912, 30.4763)
  line L47 (-218.5912, 30.4763) -> (-218.5912, 92.9237)
  line L48 (-125.9697, 94.8493) -> (-125.9697, 72.8493)
  line L49 (-125.9697, 72.8493) -> (-92.9697, 72.8493)
  line L50 (-92.9697, 72.8493) -> (-92.9697, 94.8493)
  line L51 (-92.9697, 94.8493) -> (-125.9697, 94.8493)
  line L52 (-125.9697, 50.5493) -> (-125.9697, 28.5493)
  line L53 (-125.9697, 28.5493) -> (-92.9697, 28.5493)
  line L54 (-92.9697, 28.5493) -> (-92.9697, 50.5493)
  line L55 (-92.9697, 50.5493) -> (-125.9697, 50.5493)
  line L56 (-186.4722, 72.6993) -> (-219.4722, 72.6993)
  line L57 (-219.4722, 72.6993) -> (-219.4722, 50.6993)
  line L58 (-219.4722, 50.6993) -> (-186.4722, 50.6993)
  line L59 (-186.4722, 50.6993) -> (-186.4722, 72.6993)
  line L60 (-125.9697, 92.9237) -> (-218.5912, 78.7743)
  line L61 (-125.9697, 30.4763) -> (-218.5912, 44.6243)
  line L62 (-125.9697, 92.9237) -> (-120.9697, 97.9237)
  line L63 (-125.9697, 30.4763) -> (-120.9697, 25.4763)
  line L64 (-223.5912, 25.4763) -> (-87.9697, 25.4763) projected
  line L65 (-218.5912, 78.7743) -> (-223.5912, 78.7743)
  line L66 (-218.5912, 44.6243) -> (-223.5912, 44.6243)
  point P0 (0, 0)
  point P1 (-186.3896, 83.6936)
  point P2 (-185.8613, 83.7743)
  dimension "d72" = 5
  dimension "d73" = 5
  dimension "d74" = 5
  dimension "d75" = 5
  dimension "d76" = 5
extrude "Extrusion7" cut sketch "Sketch6" against normal blind 10 contours L60 L47 L43 L39 L40 | L65 L14 L13 L62 L51 L48 L43 L47 | L48 L51 L62 | L66 L47 L46 L52 L53 L63 L15 L14 | L61 L46 L47 | L63 L53 L52
properties part number "RevisedServoTray"
